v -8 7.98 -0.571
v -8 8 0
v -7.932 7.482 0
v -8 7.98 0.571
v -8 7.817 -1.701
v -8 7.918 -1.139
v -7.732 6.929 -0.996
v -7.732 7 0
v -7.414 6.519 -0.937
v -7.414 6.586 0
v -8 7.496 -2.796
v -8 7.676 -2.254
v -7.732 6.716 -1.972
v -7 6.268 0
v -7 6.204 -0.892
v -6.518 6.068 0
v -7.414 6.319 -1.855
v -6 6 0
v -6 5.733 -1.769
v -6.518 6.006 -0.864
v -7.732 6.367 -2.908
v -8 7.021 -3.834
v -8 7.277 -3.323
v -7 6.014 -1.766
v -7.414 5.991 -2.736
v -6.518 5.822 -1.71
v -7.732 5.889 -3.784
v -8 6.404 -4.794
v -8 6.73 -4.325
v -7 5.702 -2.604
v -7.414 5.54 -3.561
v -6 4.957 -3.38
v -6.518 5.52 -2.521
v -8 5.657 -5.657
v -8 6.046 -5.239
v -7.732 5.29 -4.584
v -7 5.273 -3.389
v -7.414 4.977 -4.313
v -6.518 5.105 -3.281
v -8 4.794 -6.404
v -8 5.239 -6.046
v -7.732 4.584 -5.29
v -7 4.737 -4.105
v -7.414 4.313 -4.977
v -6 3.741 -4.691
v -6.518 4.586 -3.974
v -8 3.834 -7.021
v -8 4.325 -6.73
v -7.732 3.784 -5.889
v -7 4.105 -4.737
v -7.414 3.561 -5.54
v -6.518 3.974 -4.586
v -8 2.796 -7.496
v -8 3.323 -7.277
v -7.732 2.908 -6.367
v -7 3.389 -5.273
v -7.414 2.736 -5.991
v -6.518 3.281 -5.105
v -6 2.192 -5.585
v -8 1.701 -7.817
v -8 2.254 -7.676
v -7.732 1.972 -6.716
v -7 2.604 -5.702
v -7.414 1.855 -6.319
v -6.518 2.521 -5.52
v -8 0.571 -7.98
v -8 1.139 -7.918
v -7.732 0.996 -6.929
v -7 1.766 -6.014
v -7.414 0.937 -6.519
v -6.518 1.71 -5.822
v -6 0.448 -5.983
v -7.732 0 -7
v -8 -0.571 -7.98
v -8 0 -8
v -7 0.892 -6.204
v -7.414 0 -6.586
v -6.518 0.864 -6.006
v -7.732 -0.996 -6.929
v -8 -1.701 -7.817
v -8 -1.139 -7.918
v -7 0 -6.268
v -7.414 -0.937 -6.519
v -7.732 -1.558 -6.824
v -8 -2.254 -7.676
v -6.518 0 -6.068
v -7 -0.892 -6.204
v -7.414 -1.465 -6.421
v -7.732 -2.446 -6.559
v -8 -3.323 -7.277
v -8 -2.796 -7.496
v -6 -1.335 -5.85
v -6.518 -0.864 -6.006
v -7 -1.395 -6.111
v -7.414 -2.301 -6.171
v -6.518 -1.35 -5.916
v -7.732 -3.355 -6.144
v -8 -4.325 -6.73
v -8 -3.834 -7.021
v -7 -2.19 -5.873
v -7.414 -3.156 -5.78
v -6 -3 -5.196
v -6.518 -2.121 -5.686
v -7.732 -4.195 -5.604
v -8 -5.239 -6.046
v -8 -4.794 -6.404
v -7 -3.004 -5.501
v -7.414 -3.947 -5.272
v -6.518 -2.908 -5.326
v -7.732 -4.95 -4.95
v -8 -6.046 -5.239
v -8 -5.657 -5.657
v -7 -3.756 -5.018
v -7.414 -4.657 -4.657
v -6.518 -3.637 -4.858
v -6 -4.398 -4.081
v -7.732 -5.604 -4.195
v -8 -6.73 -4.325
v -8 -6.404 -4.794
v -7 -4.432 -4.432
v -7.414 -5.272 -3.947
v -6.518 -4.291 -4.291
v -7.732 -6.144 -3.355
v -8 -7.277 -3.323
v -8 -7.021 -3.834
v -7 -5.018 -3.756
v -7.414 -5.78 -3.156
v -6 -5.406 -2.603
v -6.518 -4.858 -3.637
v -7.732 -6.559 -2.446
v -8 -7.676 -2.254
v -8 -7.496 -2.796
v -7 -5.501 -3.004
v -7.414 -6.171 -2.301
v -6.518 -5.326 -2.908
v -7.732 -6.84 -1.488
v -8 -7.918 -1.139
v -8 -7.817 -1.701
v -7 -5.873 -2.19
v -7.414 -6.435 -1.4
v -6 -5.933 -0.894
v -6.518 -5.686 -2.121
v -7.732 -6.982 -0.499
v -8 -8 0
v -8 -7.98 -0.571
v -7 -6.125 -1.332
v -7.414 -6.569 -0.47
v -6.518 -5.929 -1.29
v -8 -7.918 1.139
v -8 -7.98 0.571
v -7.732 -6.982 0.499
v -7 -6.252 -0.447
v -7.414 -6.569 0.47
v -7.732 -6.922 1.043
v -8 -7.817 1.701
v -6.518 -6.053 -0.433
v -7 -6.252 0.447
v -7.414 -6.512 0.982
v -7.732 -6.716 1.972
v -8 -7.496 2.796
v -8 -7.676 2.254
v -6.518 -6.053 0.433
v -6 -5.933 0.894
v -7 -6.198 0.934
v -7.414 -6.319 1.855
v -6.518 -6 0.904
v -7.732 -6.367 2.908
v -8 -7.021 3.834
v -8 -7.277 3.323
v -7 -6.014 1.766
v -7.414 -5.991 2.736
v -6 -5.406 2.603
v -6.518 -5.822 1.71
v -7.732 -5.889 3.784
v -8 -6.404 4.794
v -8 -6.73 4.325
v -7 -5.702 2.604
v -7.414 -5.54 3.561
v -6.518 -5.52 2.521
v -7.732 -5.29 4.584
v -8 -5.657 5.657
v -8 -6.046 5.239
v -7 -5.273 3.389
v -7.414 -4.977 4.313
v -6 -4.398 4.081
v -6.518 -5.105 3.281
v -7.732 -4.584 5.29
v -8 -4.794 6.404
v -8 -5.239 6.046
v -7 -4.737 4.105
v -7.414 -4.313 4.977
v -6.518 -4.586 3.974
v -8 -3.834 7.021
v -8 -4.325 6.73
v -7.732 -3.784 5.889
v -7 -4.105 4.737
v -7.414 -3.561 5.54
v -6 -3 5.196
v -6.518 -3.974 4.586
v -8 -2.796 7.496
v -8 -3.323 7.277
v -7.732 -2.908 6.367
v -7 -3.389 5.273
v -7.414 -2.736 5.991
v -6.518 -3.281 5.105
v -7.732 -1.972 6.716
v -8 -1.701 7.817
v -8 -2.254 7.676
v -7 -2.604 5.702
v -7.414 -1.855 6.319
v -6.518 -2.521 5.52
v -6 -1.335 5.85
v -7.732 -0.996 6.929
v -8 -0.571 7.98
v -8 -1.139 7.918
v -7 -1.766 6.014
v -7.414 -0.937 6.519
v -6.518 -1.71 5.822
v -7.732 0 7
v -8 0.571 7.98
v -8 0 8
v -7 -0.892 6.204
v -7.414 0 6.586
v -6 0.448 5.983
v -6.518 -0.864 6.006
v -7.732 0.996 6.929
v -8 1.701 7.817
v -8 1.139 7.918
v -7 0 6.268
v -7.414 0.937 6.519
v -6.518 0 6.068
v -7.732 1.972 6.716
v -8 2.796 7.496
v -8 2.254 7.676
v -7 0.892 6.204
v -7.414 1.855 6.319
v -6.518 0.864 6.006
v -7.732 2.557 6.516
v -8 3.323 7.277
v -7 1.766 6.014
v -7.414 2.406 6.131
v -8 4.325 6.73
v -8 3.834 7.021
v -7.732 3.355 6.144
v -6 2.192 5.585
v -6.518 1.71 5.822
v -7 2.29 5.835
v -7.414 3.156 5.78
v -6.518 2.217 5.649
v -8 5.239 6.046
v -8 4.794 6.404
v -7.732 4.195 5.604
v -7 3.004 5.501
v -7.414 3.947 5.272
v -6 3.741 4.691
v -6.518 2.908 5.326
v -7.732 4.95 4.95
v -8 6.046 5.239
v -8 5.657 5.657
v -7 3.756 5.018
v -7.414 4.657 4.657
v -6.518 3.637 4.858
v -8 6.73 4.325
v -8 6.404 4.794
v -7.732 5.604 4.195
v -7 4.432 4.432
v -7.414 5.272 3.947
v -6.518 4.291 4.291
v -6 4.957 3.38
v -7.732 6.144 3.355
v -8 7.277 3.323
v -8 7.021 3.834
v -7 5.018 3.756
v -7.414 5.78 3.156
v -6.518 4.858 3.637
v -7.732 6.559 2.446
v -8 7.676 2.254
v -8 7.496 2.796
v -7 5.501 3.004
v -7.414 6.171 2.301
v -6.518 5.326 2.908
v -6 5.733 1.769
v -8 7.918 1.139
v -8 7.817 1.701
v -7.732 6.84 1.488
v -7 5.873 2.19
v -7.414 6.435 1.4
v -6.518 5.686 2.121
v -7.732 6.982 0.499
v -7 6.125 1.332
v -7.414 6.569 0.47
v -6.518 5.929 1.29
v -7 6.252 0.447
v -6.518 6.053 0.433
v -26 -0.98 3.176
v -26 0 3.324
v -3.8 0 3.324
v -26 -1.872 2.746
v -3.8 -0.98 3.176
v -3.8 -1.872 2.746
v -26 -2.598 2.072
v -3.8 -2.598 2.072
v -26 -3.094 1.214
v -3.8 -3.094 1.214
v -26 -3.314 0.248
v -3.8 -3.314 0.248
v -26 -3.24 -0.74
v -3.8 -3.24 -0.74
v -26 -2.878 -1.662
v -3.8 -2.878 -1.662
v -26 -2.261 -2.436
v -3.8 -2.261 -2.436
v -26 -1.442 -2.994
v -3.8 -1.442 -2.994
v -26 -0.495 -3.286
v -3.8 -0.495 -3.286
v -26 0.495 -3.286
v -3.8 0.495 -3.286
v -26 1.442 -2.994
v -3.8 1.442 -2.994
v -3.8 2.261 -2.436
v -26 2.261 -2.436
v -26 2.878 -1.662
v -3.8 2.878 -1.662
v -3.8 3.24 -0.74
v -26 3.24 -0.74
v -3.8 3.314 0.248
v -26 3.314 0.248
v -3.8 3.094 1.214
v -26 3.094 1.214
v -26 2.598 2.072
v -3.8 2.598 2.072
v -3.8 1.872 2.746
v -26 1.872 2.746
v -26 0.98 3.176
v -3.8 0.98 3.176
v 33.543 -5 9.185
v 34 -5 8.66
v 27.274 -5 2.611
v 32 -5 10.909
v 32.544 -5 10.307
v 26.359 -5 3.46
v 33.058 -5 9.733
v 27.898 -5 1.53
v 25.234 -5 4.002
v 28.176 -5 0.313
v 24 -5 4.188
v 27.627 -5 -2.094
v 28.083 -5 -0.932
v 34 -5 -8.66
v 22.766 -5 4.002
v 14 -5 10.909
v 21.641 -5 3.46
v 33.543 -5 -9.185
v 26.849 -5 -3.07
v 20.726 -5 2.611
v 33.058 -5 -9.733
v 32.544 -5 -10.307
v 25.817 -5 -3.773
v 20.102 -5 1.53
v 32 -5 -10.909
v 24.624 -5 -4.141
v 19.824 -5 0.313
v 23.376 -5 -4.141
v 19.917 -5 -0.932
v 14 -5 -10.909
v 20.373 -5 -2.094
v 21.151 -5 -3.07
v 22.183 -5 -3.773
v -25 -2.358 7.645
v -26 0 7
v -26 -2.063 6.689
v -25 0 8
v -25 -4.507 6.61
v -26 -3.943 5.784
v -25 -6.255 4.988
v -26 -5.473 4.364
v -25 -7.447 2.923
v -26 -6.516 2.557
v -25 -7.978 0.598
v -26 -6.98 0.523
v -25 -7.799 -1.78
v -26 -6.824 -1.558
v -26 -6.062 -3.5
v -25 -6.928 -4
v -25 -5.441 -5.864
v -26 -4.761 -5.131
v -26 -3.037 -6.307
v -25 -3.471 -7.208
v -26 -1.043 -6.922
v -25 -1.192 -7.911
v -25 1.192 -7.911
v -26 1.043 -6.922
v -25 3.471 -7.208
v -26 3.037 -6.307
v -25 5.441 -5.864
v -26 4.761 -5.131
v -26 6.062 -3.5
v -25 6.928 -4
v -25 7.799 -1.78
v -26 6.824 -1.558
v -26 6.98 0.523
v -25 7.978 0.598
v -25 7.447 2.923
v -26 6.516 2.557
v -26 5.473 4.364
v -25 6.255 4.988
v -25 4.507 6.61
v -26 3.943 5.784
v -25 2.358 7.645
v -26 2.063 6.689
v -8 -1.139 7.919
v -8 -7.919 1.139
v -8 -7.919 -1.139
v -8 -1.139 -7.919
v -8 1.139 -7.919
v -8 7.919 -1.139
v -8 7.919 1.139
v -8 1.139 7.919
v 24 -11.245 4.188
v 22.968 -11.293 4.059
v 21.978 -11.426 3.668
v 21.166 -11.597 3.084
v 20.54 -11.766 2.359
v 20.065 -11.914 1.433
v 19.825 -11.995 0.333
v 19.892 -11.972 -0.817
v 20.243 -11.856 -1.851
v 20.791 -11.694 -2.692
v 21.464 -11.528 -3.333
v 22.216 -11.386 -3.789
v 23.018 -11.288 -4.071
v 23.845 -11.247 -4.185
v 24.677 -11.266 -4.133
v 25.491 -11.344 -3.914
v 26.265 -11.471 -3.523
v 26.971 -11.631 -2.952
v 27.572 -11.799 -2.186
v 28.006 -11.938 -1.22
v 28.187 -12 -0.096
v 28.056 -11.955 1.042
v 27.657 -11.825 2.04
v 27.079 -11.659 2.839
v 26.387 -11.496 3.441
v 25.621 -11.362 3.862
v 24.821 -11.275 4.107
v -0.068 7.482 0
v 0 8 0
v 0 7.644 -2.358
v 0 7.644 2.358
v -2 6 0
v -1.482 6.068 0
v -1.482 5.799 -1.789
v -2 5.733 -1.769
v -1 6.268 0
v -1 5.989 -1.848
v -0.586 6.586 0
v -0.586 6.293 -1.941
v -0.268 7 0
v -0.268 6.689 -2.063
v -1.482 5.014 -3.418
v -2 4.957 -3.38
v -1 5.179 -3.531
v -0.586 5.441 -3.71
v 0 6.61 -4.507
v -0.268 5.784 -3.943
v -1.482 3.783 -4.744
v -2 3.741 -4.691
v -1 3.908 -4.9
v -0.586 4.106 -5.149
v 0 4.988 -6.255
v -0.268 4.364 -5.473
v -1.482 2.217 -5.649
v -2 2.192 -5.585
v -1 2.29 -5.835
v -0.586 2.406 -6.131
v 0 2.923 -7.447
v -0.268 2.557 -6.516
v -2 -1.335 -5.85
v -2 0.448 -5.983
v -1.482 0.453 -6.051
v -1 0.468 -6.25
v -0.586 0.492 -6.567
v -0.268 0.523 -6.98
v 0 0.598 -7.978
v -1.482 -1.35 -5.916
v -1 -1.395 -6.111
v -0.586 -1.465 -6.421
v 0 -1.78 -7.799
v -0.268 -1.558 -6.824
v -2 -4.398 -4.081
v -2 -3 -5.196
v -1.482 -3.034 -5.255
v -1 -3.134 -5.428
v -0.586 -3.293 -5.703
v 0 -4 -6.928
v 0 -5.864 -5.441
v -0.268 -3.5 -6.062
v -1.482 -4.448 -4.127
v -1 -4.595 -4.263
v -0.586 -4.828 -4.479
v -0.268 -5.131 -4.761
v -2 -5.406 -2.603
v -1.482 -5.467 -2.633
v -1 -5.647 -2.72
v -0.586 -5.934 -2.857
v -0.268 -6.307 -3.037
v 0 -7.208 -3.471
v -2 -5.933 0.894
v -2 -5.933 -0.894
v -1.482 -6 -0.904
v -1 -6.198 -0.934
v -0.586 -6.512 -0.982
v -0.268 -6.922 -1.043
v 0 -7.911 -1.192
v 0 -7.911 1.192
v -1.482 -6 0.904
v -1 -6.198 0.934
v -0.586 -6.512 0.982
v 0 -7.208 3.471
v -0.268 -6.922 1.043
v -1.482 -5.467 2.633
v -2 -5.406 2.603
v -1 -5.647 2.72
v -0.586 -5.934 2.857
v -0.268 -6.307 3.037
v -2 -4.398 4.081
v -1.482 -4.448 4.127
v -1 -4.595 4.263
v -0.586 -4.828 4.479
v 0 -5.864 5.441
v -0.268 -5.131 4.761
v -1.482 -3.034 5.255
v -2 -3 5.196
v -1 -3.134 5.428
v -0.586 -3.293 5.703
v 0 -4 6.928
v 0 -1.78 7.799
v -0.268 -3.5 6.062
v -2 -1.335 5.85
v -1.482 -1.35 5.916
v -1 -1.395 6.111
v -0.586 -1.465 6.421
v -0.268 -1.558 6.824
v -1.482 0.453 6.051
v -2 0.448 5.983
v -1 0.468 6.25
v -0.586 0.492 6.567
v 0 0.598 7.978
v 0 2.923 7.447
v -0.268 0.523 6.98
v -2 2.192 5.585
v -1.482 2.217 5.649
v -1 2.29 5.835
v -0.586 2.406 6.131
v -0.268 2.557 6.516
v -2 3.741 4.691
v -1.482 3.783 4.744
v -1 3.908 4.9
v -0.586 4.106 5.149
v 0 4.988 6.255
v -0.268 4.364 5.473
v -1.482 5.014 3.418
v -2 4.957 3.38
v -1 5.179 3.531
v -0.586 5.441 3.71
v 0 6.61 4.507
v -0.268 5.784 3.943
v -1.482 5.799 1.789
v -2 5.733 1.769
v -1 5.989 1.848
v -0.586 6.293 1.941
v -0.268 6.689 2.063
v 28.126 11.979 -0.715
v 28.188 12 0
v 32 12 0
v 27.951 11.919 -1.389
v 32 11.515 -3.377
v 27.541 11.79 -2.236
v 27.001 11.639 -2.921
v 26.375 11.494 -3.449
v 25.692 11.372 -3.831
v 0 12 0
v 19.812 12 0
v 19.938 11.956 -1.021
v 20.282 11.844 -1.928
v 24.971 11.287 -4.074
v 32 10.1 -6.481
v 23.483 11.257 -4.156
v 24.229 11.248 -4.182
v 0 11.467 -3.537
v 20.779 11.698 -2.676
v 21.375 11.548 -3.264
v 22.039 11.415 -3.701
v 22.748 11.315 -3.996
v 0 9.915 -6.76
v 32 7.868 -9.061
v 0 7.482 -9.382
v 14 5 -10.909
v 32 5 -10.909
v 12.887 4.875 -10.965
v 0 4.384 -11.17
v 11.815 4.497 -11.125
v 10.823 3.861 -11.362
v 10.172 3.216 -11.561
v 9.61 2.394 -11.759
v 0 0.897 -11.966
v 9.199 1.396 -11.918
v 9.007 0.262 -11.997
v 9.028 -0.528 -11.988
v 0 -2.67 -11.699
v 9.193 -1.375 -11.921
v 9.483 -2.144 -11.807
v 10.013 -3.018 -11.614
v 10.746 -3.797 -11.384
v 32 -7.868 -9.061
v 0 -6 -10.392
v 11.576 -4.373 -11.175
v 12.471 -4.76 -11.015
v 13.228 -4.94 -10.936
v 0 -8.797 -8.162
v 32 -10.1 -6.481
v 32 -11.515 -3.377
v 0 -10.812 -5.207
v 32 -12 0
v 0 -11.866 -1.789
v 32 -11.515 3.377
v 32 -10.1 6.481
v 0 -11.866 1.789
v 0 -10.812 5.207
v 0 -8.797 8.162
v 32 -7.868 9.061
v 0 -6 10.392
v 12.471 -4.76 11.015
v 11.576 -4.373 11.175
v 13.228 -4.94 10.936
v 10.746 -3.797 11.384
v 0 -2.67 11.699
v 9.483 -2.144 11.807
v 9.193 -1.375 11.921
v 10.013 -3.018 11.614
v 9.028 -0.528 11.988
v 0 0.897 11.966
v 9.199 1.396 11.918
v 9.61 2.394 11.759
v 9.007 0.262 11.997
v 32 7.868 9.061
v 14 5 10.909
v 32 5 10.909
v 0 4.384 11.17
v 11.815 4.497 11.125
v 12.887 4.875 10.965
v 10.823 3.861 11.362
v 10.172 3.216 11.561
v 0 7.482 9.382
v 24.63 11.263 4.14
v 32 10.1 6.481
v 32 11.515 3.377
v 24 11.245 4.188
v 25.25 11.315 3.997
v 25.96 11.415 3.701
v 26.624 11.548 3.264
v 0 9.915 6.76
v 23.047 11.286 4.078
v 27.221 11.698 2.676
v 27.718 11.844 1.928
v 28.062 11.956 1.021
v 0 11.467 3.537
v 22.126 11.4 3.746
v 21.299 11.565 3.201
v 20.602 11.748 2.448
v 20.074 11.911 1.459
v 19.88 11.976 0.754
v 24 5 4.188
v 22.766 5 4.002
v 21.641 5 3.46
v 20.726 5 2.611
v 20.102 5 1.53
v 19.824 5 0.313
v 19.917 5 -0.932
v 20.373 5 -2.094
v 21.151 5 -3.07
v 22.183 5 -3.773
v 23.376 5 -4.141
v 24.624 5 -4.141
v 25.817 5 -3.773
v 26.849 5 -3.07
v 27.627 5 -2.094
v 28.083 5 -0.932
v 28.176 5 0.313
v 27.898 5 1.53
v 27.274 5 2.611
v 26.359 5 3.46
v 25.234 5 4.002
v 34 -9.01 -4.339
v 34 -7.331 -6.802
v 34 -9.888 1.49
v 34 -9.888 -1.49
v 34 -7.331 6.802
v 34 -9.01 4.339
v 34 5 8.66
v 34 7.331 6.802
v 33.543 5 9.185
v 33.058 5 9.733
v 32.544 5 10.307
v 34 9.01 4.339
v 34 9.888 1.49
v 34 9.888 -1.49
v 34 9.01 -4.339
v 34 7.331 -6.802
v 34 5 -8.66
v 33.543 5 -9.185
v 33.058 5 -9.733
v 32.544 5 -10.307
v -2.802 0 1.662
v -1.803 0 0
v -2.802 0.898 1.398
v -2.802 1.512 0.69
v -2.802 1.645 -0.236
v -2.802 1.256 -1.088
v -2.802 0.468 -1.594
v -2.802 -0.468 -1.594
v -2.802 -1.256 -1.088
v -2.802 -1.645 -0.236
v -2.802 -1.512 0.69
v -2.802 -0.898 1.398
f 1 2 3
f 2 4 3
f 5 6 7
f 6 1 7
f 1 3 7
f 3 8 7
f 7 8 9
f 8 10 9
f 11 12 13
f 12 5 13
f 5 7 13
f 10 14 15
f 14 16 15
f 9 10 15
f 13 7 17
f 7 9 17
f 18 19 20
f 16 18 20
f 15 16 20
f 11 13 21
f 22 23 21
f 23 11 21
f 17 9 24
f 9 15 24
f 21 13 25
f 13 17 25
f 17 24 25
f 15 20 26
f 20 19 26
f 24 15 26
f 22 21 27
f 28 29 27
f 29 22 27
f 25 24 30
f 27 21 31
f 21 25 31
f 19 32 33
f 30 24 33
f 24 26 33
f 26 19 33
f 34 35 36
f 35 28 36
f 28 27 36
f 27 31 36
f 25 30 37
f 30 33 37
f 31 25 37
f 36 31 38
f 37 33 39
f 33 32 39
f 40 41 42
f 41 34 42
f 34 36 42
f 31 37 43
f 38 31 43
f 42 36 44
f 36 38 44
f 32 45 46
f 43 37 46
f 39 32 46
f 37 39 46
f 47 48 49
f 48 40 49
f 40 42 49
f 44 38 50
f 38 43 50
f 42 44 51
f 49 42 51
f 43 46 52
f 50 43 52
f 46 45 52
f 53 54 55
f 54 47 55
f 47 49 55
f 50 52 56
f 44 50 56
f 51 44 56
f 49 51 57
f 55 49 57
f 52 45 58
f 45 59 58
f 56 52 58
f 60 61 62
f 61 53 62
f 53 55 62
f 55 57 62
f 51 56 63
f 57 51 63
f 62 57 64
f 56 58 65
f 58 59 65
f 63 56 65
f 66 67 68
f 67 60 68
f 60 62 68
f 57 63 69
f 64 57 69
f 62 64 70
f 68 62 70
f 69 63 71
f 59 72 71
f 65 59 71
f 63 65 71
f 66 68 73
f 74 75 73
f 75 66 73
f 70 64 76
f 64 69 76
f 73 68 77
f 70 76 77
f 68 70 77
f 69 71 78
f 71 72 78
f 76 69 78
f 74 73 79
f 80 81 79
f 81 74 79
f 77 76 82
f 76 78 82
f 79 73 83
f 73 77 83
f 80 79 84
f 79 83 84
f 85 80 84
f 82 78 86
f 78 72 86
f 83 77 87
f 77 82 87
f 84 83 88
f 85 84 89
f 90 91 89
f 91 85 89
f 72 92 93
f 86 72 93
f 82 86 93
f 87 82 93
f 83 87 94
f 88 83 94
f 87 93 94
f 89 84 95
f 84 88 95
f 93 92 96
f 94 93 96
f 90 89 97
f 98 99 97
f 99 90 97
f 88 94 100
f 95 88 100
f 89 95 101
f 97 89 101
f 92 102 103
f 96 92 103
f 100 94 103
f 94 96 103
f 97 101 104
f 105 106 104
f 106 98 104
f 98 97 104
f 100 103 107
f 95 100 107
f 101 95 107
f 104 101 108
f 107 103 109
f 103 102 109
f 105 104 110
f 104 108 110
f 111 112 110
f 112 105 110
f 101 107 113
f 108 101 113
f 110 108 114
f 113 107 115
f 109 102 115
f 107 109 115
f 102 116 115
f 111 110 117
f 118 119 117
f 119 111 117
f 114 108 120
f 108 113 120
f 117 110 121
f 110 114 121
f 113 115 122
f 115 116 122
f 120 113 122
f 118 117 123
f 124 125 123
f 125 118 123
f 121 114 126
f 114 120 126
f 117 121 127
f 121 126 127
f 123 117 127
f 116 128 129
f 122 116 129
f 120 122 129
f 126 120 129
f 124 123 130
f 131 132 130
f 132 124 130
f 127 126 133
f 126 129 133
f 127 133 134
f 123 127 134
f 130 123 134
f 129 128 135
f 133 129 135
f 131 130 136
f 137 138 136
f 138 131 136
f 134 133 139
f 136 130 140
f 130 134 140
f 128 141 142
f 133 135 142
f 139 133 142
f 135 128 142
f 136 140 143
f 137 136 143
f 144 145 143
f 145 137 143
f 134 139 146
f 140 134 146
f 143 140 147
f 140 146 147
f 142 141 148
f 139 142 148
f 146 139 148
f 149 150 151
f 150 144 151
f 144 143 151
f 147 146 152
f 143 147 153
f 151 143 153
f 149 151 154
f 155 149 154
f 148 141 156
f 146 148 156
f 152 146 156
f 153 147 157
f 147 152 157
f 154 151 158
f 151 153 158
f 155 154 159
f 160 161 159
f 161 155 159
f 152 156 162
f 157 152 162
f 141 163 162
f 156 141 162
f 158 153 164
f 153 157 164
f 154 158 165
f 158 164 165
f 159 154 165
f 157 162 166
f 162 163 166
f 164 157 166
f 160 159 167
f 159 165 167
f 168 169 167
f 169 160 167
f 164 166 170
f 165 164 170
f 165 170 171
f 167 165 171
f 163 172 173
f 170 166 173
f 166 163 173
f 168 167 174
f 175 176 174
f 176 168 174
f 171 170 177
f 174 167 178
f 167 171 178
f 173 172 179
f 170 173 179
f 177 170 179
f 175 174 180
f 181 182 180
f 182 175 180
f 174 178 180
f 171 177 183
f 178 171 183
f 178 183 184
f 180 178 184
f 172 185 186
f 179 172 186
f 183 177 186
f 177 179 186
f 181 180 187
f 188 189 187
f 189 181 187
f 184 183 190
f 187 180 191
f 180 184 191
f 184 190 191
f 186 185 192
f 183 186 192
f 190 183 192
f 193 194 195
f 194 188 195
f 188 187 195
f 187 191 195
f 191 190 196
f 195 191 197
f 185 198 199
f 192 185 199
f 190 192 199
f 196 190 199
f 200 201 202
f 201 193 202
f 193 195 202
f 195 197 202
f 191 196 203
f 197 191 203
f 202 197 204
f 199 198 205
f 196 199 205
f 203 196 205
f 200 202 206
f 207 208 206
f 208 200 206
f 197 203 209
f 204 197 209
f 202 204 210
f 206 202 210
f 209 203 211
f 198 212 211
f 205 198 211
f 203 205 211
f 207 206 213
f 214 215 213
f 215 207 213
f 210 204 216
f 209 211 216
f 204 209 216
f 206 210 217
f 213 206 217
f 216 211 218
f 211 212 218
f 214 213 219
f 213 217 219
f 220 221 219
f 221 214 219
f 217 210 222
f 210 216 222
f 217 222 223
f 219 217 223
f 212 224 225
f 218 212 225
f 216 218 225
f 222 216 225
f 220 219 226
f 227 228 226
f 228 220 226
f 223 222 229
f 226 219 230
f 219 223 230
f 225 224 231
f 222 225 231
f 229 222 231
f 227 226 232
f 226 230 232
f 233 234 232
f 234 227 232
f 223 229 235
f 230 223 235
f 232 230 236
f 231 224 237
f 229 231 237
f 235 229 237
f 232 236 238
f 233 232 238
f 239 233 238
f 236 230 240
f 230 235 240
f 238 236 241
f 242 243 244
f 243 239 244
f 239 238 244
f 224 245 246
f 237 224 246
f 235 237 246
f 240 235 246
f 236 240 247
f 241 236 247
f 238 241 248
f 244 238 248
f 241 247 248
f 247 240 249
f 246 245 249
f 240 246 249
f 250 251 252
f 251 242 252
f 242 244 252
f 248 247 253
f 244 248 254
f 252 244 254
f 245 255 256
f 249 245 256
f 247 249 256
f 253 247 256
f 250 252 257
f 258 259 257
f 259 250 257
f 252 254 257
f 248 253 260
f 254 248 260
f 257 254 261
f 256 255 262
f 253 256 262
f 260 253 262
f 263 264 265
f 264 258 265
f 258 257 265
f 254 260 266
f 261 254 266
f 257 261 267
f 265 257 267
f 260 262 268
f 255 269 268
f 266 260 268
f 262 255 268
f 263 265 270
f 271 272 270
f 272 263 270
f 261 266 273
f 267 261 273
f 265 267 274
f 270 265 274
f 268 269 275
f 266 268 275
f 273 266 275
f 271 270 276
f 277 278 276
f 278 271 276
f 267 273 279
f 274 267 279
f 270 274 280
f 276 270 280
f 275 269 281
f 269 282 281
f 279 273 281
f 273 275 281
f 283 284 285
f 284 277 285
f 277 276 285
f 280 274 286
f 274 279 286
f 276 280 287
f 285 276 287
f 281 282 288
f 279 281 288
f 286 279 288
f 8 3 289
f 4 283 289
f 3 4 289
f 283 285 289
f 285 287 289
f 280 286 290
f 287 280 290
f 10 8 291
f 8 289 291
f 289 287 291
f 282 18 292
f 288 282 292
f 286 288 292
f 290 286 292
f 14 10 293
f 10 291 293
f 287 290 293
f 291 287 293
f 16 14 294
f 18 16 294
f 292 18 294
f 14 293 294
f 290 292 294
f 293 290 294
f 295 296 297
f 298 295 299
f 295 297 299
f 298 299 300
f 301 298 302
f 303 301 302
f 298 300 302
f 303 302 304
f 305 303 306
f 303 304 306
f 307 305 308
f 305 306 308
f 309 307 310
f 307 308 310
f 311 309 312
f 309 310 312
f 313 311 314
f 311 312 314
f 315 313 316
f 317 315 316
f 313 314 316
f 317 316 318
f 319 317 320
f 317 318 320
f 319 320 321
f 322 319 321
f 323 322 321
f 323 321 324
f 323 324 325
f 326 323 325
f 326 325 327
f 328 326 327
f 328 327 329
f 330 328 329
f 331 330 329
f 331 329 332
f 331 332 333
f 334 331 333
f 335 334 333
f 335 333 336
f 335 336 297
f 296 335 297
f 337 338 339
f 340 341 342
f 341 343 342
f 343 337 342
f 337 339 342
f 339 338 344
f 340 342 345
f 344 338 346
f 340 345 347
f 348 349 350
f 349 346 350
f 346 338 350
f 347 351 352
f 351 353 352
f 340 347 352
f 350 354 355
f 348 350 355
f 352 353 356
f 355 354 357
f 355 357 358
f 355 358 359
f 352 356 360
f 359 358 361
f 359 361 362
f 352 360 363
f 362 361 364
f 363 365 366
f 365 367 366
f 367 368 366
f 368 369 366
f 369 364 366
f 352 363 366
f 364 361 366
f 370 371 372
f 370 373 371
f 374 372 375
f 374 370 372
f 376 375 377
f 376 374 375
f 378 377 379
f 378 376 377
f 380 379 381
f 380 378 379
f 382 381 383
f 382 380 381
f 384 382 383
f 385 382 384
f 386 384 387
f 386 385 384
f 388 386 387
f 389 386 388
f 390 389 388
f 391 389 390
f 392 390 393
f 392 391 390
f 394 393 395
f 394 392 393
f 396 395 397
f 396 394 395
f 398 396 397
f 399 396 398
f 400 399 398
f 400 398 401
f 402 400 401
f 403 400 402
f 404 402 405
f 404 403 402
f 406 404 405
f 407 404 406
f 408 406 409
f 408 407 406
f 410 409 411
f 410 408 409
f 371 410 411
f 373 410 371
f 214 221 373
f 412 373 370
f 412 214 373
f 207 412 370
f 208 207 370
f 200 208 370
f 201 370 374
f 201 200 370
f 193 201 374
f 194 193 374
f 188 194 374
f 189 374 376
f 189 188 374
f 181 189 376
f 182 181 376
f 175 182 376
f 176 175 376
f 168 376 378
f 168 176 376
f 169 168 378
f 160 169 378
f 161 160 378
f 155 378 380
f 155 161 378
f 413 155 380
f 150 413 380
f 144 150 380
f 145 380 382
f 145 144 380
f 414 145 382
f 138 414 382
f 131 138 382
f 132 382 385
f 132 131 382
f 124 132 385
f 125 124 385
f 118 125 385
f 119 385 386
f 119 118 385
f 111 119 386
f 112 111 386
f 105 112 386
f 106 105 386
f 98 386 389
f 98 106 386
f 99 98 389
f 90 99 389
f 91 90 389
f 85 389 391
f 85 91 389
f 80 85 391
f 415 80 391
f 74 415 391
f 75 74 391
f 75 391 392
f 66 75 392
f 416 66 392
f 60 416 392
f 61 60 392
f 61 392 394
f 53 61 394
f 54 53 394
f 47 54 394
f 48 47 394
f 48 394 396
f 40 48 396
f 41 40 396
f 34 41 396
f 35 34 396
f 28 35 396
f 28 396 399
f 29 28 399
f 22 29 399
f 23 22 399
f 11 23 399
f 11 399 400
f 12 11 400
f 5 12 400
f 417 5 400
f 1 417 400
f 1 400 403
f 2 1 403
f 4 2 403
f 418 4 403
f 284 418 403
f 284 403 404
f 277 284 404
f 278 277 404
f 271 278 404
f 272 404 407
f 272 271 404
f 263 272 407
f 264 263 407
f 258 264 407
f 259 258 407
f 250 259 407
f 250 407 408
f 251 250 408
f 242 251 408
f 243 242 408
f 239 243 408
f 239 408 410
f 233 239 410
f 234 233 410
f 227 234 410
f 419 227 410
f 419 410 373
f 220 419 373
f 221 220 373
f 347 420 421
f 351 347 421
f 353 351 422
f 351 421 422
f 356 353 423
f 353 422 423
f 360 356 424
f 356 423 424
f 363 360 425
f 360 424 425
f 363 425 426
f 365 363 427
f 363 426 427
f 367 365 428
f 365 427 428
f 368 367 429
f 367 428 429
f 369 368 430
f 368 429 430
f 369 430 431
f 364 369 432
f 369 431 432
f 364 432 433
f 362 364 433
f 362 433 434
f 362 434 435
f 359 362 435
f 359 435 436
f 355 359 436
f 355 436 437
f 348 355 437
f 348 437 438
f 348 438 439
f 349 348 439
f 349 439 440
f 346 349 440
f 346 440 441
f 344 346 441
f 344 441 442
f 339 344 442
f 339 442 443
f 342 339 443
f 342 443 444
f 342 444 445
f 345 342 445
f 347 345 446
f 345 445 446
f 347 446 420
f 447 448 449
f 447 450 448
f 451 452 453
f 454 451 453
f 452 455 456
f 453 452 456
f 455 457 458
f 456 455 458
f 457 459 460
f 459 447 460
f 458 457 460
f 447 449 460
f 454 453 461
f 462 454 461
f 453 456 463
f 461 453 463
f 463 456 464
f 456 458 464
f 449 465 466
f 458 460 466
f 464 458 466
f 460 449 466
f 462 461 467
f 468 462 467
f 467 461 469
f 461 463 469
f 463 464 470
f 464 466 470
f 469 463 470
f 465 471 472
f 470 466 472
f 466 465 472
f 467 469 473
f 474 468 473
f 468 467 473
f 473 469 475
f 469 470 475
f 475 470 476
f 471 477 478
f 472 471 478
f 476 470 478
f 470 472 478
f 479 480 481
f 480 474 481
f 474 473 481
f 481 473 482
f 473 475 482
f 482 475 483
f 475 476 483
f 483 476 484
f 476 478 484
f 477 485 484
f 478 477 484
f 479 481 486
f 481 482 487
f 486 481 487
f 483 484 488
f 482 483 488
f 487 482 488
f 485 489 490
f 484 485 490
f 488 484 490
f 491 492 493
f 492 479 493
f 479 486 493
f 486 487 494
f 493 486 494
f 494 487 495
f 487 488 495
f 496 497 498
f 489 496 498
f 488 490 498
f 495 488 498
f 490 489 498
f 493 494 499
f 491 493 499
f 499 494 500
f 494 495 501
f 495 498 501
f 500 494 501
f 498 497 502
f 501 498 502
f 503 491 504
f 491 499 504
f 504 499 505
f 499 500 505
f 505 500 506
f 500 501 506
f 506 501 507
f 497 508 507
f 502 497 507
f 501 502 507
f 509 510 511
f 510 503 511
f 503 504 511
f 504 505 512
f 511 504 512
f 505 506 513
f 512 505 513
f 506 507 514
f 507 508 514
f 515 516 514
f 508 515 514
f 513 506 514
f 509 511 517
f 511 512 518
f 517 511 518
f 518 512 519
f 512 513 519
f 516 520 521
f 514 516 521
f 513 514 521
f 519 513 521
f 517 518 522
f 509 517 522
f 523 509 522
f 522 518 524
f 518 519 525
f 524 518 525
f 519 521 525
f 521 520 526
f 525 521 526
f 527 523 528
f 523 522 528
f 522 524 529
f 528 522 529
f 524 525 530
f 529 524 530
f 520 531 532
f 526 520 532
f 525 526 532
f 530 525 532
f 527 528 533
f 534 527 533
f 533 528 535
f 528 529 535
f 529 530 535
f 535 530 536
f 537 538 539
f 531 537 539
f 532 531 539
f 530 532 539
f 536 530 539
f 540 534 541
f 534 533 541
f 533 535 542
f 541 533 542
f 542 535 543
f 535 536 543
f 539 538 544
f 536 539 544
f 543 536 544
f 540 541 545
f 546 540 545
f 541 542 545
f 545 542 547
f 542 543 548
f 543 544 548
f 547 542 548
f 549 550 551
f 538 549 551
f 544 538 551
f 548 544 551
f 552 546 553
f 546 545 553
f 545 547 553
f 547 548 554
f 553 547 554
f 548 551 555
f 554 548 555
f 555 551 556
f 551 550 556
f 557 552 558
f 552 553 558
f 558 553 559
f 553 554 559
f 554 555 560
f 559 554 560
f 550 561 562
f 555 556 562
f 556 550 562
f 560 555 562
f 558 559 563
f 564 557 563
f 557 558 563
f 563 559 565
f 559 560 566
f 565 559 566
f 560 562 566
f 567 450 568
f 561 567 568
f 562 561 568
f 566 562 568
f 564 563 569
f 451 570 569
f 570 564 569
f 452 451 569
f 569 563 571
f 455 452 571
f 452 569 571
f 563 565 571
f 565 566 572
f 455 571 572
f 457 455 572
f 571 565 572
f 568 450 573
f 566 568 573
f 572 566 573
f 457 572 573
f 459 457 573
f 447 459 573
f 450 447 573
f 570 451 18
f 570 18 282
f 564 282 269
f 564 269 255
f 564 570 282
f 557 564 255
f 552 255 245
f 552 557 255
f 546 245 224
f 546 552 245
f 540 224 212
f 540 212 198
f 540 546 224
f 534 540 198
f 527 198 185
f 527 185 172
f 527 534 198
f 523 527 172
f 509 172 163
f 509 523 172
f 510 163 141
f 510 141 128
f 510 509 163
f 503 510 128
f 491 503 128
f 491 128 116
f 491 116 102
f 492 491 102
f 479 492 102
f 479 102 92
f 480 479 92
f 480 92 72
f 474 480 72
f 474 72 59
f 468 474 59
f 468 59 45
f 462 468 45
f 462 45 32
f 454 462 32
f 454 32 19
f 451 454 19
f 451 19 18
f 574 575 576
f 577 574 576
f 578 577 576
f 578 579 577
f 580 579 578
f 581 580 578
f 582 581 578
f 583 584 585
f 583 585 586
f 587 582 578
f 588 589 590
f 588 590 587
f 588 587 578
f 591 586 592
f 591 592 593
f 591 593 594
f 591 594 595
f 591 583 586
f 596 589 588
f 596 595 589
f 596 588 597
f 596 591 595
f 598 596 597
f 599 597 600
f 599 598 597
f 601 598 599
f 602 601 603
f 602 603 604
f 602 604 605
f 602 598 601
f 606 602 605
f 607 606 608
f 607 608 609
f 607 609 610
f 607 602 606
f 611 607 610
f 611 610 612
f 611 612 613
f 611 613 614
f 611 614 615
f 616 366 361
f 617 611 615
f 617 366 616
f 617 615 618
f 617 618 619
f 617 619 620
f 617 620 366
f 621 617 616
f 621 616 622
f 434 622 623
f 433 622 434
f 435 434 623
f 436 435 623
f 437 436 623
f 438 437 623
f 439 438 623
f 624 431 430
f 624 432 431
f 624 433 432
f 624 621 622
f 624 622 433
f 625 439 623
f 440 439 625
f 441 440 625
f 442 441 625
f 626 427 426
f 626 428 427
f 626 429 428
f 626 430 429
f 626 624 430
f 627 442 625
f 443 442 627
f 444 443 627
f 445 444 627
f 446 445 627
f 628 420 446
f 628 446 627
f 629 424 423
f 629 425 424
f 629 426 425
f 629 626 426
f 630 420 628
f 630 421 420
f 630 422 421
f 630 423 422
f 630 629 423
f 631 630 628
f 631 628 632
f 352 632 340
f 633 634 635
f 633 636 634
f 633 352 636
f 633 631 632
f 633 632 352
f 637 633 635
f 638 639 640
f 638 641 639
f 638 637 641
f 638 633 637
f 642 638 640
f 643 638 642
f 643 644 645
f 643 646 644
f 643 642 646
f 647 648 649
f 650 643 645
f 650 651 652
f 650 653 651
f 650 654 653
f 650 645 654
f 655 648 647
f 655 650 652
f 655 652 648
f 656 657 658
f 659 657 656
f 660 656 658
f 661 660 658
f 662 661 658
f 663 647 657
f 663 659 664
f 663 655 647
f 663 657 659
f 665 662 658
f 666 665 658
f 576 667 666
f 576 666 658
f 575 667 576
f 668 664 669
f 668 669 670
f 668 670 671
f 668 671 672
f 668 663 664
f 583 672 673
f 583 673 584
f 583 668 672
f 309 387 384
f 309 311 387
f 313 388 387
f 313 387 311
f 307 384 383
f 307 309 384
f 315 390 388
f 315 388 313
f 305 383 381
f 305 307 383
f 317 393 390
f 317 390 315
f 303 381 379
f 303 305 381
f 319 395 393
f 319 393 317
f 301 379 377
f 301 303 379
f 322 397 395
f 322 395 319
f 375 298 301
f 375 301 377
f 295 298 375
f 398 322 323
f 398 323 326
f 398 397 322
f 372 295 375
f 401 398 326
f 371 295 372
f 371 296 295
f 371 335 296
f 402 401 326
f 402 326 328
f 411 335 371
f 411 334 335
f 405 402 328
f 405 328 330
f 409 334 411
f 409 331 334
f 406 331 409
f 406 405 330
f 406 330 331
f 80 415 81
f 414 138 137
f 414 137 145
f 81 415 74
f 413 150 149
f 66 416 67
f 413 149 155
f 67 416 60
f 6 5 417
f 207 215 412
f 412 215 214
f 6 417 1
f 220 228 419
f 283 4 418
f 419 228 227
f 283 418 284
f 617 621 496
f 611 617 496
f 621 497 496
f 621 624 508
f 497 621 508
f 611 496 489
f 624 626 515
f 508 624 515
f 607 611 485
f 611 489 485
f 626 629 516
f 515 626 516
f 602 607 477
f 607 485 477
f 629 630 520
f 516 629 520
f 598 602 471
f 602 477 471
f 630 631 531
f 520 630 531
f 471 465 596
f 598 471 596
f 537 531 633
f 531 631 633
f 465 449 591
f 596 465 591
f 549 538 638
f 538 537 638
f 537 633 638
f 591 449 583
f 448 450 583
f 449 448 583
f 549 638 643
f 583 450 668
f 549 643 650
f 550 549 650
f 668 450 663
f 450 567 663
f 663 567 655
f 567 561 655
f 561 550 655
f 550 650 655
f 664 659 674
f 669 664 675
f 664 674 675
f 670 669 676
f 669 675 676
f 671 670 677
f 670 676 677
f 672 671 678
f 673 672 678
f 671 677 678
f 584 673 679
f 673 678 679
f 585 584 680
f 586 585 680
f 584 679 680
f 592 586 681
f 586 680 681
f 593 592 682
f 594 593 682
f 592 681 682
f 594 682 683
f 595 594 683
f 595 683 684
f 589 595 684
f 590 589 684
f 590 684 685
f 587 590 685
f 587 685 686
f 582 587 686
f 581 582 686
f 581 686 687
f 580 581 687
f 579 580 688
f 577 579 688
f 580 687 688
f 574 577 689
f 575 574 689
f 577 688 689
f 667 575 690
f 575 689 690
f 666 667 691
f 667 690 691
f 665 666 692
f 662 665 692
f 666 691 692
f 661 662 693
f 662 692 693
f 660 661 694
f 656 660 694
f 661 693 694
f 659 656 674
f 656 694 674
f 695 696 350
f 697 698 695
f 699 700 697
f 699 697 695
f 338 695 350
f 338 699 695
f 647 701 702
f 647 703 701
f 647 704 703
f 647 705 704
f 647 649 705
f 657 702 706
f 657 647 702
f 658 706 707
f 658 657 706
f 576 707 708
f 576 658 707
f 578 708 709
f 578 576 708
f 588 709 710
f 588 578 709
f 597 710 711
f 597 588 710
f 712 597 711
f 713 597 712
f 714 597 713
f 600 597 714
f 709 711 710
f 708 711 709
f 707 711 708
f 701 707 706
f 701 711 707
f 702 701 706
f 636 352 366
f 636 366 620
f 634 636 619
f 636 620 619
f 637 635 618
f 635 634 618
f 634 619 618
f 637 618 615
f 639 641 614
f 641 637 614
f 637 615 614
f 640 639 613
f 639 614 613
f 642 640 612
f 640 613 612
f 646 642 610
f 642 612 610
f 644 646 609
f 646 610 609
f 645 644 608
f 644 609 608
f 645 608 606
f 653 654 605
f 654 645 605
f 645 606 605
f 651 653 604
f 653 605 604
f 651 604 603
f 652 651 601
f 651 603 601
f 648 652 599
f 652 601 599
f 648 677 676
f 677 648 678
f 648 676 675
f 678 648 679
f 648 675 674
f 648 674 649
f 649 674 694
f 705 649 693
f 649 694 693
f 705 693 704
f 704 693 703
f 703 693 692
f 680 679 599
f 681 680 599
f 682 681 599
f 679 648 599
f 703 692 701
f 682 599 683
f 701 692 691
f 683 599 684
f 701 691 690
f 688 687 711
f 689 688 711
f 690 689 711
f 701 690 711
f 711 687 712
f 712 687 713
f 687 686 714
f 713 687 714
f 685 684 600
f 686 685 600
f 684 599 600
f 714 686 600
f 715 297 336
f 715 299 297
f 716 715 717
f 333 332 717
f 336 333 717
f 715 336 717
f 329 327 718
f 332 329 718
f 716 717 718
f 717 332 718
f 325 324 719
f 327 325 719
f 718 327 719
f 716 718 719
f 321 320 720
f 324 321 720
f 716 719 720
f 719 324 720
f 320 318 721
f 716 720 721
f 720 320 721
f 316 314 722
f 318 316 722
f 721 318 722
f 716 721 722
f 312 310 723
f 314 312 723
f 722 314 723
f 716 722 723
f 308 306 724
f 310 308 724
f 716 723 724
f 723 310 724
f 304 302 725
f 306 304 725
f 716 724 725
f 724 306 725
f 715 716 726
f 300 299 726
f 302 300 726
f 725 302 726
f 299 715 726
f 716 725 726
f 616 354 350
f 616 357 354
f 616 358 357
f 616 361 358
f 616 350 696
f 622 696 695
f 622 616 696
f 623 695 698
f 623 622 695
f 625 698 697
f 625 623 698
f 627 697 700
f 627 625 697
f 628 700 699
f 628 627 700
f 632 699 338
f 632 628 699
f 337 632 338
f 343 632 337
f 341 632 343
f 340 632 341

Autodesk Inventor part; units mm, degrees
ref_plane "YZ Plane" through (0, 0, 0) normal (1, 0, 0) x (0, 1, 0)
ref_plane "XY Plane" through (0, 0, 0) normal (0, 0, 1) x (1, 0, 0)
sketch "Sketch1" plane through (0, 0, 0) normal (1, 0, 0) x (0, 1, 0)
  circle A0 centre (0, 0) radius 12
  dimension "d0" = 24
extrude "Extrusion1" add sketch "Sketch1" along normal blind 34
chamfer "Chamfer1" distance 2 angle 45 1 edges at (34, -12, 0)
sketch "Sketch2" plane through (0, 0, 0) normal (0, 0, 1) x (1, 0, 0)
  line L0 (0, -12) -> (0, 12) construction
  line L1 (32, -12) -> (32, 12) construction
  line L2 (0, 0) -> (32, 0) construction
  line L3 (14, 5) -> (34, 5)
  line L4 (34, -5) -> (14, -5)
  line L5 (34, 10) -> (34, -10) projected
  arc A0 (14, 5) -> (14, -5) centre (14, 0) ccw
  dimension "d8" = 10
  dimension "d9" = 5
extrude "Extrusion2" cut sketch "Sketch2" along normal through all both and the other way through all
sketch "Sketch5" plane through (0, 0, 0) normal (1, 0, 0) x (0, 1, 0)
  circle A0 centre (0, 0) radius 12 construction
  circle A1 centre (0, 0) radius 6
  dimension "d27" = 12
extrude "Extrusion3" add sketch "Sketch5" against normal blind 8
sketch "Sketch6" plane through (-8, 0, 0) normal (-1, 0, 0) x (0, 0, 1)
  circle A0 centre (0, 0) radius 6 projected
  circle A1 centre (0, 0) radius 8
  dimension "d30" = 16
extrude "Extrusion4" add sketch "Sketch6" along normal blind 18 contours A0 | A1
fillet "Fillet1" radius 2 2 edges at (0, -6, 0) (-8, -6, 0)
chamfer "Chamfer2" distance 1 angle 45 1 edges at (-26, 0, -8)
sketch "Sketch7" plane through (-26, 0, 0) normal (-1, 0, 0) x (0, 0, 1)
  circle A0 centre (0, 0) radius 8 projected
hole "Hole3" at (-26, 0, 0) direction (1, 0, 0) diameter 6.647 depth 22.2 tip angle 118 thread size "M8x1.25" class "6H" standard "ISO Metric profile"
ref_plane "Work Plane1" through (0, 12, 0) normal (0, 1, 0) x (-1, 0, 0)
sketch "Sketch9" plane through (0, 12, 0) normal (0, 1, 0) x (-1, 0, 0)
  line L0 (0, 12) -> (0, -12) construction
  line L1 (-32, 10.9087) -> (-14, 10.9087) construction
  line L2 (-14, 10.9087) -> (-32, 10.9087) construction
  line L3 (-32, -10.9087) -> (-32, 10.9087) construction
  line L4 (-32, -10.9087) -> (-14, -10.9087) construction
  line L5 (-14, -10.9087) -> (-32, -10.9087) construction
  line L6 (-32, 10.9087) -> (-32, -10.9087) construction
  line L7 (-34, -8.6603) -> (-34, 8.6603) construction
  point P0 (0, 0)
  point P1 (-24, 0)
  point P2 (-34, 0)
  dimension "d52" = 10
hole "Hole5" at (24, 12, 0) direction (0, -1, 0) diameter 8.376 depth 27.3 tip angle 118 thread size "M10x1.5" class "6H" standard "ISO Metric profile"
properties part number "Part11.End Fork" material "Steel, Carbon"
